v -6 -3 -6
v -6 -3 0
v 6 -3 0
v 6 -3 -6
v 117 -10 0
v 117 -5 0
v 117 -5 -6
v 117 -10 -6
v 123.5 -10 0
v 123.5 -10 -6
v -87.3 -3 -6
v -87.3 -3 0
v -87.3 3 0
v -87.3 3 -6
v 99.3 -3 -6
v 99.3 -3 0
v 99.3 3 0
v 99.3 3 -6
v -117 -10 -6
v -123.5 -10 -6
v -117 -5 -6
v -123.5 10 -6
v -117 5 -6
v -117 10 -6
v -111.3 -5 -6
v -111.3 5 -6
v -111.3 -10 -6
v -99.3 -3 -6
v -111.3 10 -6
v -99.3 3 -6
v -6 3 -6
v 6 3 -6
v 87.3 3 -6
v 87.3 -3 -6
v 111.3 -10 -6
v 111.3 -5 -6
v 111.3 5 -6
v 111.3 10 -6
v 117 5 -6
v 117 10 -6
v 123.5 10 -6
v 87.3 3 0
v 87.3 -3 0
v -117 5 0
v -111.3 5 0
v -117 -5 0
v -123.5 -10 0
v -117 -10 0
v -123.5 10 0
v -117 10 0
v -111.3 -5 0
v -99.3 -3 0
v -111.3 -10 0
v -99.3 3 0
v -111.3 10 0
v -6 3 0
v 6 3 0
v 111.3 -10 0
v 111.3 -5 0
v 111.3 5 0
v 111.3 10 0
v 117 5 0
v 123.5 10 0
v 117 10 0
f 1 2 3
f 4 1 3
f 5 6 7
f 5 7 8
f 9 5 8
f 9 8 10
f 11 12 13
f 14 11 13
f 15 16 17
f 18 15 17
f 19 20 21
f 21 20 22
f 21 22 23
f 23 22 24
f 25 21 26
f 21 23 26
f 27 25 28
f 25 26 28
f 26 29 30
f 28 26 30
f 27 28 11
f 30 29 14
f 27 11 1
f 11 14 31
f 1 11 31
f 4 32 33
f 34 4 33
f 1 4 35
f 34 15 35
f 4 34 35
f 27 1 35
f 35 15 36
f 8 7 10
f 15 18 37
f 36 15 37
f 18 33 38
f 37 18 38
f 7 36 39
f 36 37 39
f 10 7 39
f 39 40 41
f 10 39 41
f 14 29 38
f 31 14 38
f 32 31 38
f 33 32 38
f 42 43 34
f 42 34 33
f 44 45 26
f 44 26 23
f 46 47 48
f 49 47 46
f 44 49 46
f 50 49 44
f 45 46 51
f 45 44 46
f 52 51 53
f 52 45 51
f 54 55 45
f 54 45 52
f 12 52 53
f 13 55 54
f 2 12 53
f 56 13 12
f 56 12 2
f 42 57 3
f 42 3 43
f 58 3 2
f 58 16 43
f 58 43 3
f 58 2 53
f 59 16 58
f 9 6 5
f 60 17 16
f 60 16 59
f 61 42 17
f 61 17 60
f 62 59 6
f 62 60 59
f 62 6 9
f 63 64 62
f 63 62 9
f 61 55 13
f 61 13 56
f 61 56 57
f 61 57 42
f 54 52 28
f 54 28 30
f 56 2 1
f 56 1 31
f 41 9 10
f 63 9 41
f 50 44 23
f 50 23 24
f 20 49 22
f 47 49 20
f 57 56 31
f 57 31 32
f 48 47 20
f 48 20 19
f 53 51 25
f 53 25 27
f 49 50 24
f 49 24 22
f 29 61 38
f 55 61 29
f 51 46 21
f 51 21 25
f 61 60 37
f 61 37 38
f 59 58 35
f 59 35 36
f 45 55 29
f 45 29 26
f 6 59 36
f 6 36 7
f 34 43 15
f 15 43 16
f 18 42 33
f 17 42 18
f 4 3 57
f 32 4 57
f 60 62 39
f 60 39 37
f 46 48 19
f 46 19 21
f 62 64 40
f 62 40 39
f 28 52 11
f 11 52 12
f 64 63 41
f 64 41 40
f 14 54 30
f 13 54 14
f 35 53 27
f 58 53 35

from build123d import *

# Parameters (mm, degrees)
SKETCH1_W           = 12
SKETCH1_H           = 6
BOSS_EXTRUDE1_DEPTH = 6


with BuildPart() as part:
    # Sketch1 → Boss-Extrude1 (new body)
    with BuildSketch(Plane.XY):
        Polygon((-123.5, 10), (-123.5, -10), (-117, -10), (-117, -5), (-111.3, -5), (-111.3, -10), (111.3, -10), (111.3, -5), (117, -5), (117, -10), (123.5, -10), (123.5, 10), (117, 10), (117, 5), (111.3, 5), (111.3, 10), (-111.3, 10), (-111.3, 5), (-117, 5), (-117, 10), align=None)
        with Locations((93.3, 0)):
            Rectangle(SKETCH1_W, SKETCH1_H, mode=Mode.SUBTRACT)
        with Locations((-93.3, 0)):
            Rectangle(SKETCH1_W, SKETCH1_H, mode=Mode.SUBTRACT)
        Rectangle(SKETCH1_W, SKETCH1_H, mode=Mode.SUBTRACT)
    extrude(amount=-BOSS_EXTRUDE1_DEPTH)


solid = part.part
